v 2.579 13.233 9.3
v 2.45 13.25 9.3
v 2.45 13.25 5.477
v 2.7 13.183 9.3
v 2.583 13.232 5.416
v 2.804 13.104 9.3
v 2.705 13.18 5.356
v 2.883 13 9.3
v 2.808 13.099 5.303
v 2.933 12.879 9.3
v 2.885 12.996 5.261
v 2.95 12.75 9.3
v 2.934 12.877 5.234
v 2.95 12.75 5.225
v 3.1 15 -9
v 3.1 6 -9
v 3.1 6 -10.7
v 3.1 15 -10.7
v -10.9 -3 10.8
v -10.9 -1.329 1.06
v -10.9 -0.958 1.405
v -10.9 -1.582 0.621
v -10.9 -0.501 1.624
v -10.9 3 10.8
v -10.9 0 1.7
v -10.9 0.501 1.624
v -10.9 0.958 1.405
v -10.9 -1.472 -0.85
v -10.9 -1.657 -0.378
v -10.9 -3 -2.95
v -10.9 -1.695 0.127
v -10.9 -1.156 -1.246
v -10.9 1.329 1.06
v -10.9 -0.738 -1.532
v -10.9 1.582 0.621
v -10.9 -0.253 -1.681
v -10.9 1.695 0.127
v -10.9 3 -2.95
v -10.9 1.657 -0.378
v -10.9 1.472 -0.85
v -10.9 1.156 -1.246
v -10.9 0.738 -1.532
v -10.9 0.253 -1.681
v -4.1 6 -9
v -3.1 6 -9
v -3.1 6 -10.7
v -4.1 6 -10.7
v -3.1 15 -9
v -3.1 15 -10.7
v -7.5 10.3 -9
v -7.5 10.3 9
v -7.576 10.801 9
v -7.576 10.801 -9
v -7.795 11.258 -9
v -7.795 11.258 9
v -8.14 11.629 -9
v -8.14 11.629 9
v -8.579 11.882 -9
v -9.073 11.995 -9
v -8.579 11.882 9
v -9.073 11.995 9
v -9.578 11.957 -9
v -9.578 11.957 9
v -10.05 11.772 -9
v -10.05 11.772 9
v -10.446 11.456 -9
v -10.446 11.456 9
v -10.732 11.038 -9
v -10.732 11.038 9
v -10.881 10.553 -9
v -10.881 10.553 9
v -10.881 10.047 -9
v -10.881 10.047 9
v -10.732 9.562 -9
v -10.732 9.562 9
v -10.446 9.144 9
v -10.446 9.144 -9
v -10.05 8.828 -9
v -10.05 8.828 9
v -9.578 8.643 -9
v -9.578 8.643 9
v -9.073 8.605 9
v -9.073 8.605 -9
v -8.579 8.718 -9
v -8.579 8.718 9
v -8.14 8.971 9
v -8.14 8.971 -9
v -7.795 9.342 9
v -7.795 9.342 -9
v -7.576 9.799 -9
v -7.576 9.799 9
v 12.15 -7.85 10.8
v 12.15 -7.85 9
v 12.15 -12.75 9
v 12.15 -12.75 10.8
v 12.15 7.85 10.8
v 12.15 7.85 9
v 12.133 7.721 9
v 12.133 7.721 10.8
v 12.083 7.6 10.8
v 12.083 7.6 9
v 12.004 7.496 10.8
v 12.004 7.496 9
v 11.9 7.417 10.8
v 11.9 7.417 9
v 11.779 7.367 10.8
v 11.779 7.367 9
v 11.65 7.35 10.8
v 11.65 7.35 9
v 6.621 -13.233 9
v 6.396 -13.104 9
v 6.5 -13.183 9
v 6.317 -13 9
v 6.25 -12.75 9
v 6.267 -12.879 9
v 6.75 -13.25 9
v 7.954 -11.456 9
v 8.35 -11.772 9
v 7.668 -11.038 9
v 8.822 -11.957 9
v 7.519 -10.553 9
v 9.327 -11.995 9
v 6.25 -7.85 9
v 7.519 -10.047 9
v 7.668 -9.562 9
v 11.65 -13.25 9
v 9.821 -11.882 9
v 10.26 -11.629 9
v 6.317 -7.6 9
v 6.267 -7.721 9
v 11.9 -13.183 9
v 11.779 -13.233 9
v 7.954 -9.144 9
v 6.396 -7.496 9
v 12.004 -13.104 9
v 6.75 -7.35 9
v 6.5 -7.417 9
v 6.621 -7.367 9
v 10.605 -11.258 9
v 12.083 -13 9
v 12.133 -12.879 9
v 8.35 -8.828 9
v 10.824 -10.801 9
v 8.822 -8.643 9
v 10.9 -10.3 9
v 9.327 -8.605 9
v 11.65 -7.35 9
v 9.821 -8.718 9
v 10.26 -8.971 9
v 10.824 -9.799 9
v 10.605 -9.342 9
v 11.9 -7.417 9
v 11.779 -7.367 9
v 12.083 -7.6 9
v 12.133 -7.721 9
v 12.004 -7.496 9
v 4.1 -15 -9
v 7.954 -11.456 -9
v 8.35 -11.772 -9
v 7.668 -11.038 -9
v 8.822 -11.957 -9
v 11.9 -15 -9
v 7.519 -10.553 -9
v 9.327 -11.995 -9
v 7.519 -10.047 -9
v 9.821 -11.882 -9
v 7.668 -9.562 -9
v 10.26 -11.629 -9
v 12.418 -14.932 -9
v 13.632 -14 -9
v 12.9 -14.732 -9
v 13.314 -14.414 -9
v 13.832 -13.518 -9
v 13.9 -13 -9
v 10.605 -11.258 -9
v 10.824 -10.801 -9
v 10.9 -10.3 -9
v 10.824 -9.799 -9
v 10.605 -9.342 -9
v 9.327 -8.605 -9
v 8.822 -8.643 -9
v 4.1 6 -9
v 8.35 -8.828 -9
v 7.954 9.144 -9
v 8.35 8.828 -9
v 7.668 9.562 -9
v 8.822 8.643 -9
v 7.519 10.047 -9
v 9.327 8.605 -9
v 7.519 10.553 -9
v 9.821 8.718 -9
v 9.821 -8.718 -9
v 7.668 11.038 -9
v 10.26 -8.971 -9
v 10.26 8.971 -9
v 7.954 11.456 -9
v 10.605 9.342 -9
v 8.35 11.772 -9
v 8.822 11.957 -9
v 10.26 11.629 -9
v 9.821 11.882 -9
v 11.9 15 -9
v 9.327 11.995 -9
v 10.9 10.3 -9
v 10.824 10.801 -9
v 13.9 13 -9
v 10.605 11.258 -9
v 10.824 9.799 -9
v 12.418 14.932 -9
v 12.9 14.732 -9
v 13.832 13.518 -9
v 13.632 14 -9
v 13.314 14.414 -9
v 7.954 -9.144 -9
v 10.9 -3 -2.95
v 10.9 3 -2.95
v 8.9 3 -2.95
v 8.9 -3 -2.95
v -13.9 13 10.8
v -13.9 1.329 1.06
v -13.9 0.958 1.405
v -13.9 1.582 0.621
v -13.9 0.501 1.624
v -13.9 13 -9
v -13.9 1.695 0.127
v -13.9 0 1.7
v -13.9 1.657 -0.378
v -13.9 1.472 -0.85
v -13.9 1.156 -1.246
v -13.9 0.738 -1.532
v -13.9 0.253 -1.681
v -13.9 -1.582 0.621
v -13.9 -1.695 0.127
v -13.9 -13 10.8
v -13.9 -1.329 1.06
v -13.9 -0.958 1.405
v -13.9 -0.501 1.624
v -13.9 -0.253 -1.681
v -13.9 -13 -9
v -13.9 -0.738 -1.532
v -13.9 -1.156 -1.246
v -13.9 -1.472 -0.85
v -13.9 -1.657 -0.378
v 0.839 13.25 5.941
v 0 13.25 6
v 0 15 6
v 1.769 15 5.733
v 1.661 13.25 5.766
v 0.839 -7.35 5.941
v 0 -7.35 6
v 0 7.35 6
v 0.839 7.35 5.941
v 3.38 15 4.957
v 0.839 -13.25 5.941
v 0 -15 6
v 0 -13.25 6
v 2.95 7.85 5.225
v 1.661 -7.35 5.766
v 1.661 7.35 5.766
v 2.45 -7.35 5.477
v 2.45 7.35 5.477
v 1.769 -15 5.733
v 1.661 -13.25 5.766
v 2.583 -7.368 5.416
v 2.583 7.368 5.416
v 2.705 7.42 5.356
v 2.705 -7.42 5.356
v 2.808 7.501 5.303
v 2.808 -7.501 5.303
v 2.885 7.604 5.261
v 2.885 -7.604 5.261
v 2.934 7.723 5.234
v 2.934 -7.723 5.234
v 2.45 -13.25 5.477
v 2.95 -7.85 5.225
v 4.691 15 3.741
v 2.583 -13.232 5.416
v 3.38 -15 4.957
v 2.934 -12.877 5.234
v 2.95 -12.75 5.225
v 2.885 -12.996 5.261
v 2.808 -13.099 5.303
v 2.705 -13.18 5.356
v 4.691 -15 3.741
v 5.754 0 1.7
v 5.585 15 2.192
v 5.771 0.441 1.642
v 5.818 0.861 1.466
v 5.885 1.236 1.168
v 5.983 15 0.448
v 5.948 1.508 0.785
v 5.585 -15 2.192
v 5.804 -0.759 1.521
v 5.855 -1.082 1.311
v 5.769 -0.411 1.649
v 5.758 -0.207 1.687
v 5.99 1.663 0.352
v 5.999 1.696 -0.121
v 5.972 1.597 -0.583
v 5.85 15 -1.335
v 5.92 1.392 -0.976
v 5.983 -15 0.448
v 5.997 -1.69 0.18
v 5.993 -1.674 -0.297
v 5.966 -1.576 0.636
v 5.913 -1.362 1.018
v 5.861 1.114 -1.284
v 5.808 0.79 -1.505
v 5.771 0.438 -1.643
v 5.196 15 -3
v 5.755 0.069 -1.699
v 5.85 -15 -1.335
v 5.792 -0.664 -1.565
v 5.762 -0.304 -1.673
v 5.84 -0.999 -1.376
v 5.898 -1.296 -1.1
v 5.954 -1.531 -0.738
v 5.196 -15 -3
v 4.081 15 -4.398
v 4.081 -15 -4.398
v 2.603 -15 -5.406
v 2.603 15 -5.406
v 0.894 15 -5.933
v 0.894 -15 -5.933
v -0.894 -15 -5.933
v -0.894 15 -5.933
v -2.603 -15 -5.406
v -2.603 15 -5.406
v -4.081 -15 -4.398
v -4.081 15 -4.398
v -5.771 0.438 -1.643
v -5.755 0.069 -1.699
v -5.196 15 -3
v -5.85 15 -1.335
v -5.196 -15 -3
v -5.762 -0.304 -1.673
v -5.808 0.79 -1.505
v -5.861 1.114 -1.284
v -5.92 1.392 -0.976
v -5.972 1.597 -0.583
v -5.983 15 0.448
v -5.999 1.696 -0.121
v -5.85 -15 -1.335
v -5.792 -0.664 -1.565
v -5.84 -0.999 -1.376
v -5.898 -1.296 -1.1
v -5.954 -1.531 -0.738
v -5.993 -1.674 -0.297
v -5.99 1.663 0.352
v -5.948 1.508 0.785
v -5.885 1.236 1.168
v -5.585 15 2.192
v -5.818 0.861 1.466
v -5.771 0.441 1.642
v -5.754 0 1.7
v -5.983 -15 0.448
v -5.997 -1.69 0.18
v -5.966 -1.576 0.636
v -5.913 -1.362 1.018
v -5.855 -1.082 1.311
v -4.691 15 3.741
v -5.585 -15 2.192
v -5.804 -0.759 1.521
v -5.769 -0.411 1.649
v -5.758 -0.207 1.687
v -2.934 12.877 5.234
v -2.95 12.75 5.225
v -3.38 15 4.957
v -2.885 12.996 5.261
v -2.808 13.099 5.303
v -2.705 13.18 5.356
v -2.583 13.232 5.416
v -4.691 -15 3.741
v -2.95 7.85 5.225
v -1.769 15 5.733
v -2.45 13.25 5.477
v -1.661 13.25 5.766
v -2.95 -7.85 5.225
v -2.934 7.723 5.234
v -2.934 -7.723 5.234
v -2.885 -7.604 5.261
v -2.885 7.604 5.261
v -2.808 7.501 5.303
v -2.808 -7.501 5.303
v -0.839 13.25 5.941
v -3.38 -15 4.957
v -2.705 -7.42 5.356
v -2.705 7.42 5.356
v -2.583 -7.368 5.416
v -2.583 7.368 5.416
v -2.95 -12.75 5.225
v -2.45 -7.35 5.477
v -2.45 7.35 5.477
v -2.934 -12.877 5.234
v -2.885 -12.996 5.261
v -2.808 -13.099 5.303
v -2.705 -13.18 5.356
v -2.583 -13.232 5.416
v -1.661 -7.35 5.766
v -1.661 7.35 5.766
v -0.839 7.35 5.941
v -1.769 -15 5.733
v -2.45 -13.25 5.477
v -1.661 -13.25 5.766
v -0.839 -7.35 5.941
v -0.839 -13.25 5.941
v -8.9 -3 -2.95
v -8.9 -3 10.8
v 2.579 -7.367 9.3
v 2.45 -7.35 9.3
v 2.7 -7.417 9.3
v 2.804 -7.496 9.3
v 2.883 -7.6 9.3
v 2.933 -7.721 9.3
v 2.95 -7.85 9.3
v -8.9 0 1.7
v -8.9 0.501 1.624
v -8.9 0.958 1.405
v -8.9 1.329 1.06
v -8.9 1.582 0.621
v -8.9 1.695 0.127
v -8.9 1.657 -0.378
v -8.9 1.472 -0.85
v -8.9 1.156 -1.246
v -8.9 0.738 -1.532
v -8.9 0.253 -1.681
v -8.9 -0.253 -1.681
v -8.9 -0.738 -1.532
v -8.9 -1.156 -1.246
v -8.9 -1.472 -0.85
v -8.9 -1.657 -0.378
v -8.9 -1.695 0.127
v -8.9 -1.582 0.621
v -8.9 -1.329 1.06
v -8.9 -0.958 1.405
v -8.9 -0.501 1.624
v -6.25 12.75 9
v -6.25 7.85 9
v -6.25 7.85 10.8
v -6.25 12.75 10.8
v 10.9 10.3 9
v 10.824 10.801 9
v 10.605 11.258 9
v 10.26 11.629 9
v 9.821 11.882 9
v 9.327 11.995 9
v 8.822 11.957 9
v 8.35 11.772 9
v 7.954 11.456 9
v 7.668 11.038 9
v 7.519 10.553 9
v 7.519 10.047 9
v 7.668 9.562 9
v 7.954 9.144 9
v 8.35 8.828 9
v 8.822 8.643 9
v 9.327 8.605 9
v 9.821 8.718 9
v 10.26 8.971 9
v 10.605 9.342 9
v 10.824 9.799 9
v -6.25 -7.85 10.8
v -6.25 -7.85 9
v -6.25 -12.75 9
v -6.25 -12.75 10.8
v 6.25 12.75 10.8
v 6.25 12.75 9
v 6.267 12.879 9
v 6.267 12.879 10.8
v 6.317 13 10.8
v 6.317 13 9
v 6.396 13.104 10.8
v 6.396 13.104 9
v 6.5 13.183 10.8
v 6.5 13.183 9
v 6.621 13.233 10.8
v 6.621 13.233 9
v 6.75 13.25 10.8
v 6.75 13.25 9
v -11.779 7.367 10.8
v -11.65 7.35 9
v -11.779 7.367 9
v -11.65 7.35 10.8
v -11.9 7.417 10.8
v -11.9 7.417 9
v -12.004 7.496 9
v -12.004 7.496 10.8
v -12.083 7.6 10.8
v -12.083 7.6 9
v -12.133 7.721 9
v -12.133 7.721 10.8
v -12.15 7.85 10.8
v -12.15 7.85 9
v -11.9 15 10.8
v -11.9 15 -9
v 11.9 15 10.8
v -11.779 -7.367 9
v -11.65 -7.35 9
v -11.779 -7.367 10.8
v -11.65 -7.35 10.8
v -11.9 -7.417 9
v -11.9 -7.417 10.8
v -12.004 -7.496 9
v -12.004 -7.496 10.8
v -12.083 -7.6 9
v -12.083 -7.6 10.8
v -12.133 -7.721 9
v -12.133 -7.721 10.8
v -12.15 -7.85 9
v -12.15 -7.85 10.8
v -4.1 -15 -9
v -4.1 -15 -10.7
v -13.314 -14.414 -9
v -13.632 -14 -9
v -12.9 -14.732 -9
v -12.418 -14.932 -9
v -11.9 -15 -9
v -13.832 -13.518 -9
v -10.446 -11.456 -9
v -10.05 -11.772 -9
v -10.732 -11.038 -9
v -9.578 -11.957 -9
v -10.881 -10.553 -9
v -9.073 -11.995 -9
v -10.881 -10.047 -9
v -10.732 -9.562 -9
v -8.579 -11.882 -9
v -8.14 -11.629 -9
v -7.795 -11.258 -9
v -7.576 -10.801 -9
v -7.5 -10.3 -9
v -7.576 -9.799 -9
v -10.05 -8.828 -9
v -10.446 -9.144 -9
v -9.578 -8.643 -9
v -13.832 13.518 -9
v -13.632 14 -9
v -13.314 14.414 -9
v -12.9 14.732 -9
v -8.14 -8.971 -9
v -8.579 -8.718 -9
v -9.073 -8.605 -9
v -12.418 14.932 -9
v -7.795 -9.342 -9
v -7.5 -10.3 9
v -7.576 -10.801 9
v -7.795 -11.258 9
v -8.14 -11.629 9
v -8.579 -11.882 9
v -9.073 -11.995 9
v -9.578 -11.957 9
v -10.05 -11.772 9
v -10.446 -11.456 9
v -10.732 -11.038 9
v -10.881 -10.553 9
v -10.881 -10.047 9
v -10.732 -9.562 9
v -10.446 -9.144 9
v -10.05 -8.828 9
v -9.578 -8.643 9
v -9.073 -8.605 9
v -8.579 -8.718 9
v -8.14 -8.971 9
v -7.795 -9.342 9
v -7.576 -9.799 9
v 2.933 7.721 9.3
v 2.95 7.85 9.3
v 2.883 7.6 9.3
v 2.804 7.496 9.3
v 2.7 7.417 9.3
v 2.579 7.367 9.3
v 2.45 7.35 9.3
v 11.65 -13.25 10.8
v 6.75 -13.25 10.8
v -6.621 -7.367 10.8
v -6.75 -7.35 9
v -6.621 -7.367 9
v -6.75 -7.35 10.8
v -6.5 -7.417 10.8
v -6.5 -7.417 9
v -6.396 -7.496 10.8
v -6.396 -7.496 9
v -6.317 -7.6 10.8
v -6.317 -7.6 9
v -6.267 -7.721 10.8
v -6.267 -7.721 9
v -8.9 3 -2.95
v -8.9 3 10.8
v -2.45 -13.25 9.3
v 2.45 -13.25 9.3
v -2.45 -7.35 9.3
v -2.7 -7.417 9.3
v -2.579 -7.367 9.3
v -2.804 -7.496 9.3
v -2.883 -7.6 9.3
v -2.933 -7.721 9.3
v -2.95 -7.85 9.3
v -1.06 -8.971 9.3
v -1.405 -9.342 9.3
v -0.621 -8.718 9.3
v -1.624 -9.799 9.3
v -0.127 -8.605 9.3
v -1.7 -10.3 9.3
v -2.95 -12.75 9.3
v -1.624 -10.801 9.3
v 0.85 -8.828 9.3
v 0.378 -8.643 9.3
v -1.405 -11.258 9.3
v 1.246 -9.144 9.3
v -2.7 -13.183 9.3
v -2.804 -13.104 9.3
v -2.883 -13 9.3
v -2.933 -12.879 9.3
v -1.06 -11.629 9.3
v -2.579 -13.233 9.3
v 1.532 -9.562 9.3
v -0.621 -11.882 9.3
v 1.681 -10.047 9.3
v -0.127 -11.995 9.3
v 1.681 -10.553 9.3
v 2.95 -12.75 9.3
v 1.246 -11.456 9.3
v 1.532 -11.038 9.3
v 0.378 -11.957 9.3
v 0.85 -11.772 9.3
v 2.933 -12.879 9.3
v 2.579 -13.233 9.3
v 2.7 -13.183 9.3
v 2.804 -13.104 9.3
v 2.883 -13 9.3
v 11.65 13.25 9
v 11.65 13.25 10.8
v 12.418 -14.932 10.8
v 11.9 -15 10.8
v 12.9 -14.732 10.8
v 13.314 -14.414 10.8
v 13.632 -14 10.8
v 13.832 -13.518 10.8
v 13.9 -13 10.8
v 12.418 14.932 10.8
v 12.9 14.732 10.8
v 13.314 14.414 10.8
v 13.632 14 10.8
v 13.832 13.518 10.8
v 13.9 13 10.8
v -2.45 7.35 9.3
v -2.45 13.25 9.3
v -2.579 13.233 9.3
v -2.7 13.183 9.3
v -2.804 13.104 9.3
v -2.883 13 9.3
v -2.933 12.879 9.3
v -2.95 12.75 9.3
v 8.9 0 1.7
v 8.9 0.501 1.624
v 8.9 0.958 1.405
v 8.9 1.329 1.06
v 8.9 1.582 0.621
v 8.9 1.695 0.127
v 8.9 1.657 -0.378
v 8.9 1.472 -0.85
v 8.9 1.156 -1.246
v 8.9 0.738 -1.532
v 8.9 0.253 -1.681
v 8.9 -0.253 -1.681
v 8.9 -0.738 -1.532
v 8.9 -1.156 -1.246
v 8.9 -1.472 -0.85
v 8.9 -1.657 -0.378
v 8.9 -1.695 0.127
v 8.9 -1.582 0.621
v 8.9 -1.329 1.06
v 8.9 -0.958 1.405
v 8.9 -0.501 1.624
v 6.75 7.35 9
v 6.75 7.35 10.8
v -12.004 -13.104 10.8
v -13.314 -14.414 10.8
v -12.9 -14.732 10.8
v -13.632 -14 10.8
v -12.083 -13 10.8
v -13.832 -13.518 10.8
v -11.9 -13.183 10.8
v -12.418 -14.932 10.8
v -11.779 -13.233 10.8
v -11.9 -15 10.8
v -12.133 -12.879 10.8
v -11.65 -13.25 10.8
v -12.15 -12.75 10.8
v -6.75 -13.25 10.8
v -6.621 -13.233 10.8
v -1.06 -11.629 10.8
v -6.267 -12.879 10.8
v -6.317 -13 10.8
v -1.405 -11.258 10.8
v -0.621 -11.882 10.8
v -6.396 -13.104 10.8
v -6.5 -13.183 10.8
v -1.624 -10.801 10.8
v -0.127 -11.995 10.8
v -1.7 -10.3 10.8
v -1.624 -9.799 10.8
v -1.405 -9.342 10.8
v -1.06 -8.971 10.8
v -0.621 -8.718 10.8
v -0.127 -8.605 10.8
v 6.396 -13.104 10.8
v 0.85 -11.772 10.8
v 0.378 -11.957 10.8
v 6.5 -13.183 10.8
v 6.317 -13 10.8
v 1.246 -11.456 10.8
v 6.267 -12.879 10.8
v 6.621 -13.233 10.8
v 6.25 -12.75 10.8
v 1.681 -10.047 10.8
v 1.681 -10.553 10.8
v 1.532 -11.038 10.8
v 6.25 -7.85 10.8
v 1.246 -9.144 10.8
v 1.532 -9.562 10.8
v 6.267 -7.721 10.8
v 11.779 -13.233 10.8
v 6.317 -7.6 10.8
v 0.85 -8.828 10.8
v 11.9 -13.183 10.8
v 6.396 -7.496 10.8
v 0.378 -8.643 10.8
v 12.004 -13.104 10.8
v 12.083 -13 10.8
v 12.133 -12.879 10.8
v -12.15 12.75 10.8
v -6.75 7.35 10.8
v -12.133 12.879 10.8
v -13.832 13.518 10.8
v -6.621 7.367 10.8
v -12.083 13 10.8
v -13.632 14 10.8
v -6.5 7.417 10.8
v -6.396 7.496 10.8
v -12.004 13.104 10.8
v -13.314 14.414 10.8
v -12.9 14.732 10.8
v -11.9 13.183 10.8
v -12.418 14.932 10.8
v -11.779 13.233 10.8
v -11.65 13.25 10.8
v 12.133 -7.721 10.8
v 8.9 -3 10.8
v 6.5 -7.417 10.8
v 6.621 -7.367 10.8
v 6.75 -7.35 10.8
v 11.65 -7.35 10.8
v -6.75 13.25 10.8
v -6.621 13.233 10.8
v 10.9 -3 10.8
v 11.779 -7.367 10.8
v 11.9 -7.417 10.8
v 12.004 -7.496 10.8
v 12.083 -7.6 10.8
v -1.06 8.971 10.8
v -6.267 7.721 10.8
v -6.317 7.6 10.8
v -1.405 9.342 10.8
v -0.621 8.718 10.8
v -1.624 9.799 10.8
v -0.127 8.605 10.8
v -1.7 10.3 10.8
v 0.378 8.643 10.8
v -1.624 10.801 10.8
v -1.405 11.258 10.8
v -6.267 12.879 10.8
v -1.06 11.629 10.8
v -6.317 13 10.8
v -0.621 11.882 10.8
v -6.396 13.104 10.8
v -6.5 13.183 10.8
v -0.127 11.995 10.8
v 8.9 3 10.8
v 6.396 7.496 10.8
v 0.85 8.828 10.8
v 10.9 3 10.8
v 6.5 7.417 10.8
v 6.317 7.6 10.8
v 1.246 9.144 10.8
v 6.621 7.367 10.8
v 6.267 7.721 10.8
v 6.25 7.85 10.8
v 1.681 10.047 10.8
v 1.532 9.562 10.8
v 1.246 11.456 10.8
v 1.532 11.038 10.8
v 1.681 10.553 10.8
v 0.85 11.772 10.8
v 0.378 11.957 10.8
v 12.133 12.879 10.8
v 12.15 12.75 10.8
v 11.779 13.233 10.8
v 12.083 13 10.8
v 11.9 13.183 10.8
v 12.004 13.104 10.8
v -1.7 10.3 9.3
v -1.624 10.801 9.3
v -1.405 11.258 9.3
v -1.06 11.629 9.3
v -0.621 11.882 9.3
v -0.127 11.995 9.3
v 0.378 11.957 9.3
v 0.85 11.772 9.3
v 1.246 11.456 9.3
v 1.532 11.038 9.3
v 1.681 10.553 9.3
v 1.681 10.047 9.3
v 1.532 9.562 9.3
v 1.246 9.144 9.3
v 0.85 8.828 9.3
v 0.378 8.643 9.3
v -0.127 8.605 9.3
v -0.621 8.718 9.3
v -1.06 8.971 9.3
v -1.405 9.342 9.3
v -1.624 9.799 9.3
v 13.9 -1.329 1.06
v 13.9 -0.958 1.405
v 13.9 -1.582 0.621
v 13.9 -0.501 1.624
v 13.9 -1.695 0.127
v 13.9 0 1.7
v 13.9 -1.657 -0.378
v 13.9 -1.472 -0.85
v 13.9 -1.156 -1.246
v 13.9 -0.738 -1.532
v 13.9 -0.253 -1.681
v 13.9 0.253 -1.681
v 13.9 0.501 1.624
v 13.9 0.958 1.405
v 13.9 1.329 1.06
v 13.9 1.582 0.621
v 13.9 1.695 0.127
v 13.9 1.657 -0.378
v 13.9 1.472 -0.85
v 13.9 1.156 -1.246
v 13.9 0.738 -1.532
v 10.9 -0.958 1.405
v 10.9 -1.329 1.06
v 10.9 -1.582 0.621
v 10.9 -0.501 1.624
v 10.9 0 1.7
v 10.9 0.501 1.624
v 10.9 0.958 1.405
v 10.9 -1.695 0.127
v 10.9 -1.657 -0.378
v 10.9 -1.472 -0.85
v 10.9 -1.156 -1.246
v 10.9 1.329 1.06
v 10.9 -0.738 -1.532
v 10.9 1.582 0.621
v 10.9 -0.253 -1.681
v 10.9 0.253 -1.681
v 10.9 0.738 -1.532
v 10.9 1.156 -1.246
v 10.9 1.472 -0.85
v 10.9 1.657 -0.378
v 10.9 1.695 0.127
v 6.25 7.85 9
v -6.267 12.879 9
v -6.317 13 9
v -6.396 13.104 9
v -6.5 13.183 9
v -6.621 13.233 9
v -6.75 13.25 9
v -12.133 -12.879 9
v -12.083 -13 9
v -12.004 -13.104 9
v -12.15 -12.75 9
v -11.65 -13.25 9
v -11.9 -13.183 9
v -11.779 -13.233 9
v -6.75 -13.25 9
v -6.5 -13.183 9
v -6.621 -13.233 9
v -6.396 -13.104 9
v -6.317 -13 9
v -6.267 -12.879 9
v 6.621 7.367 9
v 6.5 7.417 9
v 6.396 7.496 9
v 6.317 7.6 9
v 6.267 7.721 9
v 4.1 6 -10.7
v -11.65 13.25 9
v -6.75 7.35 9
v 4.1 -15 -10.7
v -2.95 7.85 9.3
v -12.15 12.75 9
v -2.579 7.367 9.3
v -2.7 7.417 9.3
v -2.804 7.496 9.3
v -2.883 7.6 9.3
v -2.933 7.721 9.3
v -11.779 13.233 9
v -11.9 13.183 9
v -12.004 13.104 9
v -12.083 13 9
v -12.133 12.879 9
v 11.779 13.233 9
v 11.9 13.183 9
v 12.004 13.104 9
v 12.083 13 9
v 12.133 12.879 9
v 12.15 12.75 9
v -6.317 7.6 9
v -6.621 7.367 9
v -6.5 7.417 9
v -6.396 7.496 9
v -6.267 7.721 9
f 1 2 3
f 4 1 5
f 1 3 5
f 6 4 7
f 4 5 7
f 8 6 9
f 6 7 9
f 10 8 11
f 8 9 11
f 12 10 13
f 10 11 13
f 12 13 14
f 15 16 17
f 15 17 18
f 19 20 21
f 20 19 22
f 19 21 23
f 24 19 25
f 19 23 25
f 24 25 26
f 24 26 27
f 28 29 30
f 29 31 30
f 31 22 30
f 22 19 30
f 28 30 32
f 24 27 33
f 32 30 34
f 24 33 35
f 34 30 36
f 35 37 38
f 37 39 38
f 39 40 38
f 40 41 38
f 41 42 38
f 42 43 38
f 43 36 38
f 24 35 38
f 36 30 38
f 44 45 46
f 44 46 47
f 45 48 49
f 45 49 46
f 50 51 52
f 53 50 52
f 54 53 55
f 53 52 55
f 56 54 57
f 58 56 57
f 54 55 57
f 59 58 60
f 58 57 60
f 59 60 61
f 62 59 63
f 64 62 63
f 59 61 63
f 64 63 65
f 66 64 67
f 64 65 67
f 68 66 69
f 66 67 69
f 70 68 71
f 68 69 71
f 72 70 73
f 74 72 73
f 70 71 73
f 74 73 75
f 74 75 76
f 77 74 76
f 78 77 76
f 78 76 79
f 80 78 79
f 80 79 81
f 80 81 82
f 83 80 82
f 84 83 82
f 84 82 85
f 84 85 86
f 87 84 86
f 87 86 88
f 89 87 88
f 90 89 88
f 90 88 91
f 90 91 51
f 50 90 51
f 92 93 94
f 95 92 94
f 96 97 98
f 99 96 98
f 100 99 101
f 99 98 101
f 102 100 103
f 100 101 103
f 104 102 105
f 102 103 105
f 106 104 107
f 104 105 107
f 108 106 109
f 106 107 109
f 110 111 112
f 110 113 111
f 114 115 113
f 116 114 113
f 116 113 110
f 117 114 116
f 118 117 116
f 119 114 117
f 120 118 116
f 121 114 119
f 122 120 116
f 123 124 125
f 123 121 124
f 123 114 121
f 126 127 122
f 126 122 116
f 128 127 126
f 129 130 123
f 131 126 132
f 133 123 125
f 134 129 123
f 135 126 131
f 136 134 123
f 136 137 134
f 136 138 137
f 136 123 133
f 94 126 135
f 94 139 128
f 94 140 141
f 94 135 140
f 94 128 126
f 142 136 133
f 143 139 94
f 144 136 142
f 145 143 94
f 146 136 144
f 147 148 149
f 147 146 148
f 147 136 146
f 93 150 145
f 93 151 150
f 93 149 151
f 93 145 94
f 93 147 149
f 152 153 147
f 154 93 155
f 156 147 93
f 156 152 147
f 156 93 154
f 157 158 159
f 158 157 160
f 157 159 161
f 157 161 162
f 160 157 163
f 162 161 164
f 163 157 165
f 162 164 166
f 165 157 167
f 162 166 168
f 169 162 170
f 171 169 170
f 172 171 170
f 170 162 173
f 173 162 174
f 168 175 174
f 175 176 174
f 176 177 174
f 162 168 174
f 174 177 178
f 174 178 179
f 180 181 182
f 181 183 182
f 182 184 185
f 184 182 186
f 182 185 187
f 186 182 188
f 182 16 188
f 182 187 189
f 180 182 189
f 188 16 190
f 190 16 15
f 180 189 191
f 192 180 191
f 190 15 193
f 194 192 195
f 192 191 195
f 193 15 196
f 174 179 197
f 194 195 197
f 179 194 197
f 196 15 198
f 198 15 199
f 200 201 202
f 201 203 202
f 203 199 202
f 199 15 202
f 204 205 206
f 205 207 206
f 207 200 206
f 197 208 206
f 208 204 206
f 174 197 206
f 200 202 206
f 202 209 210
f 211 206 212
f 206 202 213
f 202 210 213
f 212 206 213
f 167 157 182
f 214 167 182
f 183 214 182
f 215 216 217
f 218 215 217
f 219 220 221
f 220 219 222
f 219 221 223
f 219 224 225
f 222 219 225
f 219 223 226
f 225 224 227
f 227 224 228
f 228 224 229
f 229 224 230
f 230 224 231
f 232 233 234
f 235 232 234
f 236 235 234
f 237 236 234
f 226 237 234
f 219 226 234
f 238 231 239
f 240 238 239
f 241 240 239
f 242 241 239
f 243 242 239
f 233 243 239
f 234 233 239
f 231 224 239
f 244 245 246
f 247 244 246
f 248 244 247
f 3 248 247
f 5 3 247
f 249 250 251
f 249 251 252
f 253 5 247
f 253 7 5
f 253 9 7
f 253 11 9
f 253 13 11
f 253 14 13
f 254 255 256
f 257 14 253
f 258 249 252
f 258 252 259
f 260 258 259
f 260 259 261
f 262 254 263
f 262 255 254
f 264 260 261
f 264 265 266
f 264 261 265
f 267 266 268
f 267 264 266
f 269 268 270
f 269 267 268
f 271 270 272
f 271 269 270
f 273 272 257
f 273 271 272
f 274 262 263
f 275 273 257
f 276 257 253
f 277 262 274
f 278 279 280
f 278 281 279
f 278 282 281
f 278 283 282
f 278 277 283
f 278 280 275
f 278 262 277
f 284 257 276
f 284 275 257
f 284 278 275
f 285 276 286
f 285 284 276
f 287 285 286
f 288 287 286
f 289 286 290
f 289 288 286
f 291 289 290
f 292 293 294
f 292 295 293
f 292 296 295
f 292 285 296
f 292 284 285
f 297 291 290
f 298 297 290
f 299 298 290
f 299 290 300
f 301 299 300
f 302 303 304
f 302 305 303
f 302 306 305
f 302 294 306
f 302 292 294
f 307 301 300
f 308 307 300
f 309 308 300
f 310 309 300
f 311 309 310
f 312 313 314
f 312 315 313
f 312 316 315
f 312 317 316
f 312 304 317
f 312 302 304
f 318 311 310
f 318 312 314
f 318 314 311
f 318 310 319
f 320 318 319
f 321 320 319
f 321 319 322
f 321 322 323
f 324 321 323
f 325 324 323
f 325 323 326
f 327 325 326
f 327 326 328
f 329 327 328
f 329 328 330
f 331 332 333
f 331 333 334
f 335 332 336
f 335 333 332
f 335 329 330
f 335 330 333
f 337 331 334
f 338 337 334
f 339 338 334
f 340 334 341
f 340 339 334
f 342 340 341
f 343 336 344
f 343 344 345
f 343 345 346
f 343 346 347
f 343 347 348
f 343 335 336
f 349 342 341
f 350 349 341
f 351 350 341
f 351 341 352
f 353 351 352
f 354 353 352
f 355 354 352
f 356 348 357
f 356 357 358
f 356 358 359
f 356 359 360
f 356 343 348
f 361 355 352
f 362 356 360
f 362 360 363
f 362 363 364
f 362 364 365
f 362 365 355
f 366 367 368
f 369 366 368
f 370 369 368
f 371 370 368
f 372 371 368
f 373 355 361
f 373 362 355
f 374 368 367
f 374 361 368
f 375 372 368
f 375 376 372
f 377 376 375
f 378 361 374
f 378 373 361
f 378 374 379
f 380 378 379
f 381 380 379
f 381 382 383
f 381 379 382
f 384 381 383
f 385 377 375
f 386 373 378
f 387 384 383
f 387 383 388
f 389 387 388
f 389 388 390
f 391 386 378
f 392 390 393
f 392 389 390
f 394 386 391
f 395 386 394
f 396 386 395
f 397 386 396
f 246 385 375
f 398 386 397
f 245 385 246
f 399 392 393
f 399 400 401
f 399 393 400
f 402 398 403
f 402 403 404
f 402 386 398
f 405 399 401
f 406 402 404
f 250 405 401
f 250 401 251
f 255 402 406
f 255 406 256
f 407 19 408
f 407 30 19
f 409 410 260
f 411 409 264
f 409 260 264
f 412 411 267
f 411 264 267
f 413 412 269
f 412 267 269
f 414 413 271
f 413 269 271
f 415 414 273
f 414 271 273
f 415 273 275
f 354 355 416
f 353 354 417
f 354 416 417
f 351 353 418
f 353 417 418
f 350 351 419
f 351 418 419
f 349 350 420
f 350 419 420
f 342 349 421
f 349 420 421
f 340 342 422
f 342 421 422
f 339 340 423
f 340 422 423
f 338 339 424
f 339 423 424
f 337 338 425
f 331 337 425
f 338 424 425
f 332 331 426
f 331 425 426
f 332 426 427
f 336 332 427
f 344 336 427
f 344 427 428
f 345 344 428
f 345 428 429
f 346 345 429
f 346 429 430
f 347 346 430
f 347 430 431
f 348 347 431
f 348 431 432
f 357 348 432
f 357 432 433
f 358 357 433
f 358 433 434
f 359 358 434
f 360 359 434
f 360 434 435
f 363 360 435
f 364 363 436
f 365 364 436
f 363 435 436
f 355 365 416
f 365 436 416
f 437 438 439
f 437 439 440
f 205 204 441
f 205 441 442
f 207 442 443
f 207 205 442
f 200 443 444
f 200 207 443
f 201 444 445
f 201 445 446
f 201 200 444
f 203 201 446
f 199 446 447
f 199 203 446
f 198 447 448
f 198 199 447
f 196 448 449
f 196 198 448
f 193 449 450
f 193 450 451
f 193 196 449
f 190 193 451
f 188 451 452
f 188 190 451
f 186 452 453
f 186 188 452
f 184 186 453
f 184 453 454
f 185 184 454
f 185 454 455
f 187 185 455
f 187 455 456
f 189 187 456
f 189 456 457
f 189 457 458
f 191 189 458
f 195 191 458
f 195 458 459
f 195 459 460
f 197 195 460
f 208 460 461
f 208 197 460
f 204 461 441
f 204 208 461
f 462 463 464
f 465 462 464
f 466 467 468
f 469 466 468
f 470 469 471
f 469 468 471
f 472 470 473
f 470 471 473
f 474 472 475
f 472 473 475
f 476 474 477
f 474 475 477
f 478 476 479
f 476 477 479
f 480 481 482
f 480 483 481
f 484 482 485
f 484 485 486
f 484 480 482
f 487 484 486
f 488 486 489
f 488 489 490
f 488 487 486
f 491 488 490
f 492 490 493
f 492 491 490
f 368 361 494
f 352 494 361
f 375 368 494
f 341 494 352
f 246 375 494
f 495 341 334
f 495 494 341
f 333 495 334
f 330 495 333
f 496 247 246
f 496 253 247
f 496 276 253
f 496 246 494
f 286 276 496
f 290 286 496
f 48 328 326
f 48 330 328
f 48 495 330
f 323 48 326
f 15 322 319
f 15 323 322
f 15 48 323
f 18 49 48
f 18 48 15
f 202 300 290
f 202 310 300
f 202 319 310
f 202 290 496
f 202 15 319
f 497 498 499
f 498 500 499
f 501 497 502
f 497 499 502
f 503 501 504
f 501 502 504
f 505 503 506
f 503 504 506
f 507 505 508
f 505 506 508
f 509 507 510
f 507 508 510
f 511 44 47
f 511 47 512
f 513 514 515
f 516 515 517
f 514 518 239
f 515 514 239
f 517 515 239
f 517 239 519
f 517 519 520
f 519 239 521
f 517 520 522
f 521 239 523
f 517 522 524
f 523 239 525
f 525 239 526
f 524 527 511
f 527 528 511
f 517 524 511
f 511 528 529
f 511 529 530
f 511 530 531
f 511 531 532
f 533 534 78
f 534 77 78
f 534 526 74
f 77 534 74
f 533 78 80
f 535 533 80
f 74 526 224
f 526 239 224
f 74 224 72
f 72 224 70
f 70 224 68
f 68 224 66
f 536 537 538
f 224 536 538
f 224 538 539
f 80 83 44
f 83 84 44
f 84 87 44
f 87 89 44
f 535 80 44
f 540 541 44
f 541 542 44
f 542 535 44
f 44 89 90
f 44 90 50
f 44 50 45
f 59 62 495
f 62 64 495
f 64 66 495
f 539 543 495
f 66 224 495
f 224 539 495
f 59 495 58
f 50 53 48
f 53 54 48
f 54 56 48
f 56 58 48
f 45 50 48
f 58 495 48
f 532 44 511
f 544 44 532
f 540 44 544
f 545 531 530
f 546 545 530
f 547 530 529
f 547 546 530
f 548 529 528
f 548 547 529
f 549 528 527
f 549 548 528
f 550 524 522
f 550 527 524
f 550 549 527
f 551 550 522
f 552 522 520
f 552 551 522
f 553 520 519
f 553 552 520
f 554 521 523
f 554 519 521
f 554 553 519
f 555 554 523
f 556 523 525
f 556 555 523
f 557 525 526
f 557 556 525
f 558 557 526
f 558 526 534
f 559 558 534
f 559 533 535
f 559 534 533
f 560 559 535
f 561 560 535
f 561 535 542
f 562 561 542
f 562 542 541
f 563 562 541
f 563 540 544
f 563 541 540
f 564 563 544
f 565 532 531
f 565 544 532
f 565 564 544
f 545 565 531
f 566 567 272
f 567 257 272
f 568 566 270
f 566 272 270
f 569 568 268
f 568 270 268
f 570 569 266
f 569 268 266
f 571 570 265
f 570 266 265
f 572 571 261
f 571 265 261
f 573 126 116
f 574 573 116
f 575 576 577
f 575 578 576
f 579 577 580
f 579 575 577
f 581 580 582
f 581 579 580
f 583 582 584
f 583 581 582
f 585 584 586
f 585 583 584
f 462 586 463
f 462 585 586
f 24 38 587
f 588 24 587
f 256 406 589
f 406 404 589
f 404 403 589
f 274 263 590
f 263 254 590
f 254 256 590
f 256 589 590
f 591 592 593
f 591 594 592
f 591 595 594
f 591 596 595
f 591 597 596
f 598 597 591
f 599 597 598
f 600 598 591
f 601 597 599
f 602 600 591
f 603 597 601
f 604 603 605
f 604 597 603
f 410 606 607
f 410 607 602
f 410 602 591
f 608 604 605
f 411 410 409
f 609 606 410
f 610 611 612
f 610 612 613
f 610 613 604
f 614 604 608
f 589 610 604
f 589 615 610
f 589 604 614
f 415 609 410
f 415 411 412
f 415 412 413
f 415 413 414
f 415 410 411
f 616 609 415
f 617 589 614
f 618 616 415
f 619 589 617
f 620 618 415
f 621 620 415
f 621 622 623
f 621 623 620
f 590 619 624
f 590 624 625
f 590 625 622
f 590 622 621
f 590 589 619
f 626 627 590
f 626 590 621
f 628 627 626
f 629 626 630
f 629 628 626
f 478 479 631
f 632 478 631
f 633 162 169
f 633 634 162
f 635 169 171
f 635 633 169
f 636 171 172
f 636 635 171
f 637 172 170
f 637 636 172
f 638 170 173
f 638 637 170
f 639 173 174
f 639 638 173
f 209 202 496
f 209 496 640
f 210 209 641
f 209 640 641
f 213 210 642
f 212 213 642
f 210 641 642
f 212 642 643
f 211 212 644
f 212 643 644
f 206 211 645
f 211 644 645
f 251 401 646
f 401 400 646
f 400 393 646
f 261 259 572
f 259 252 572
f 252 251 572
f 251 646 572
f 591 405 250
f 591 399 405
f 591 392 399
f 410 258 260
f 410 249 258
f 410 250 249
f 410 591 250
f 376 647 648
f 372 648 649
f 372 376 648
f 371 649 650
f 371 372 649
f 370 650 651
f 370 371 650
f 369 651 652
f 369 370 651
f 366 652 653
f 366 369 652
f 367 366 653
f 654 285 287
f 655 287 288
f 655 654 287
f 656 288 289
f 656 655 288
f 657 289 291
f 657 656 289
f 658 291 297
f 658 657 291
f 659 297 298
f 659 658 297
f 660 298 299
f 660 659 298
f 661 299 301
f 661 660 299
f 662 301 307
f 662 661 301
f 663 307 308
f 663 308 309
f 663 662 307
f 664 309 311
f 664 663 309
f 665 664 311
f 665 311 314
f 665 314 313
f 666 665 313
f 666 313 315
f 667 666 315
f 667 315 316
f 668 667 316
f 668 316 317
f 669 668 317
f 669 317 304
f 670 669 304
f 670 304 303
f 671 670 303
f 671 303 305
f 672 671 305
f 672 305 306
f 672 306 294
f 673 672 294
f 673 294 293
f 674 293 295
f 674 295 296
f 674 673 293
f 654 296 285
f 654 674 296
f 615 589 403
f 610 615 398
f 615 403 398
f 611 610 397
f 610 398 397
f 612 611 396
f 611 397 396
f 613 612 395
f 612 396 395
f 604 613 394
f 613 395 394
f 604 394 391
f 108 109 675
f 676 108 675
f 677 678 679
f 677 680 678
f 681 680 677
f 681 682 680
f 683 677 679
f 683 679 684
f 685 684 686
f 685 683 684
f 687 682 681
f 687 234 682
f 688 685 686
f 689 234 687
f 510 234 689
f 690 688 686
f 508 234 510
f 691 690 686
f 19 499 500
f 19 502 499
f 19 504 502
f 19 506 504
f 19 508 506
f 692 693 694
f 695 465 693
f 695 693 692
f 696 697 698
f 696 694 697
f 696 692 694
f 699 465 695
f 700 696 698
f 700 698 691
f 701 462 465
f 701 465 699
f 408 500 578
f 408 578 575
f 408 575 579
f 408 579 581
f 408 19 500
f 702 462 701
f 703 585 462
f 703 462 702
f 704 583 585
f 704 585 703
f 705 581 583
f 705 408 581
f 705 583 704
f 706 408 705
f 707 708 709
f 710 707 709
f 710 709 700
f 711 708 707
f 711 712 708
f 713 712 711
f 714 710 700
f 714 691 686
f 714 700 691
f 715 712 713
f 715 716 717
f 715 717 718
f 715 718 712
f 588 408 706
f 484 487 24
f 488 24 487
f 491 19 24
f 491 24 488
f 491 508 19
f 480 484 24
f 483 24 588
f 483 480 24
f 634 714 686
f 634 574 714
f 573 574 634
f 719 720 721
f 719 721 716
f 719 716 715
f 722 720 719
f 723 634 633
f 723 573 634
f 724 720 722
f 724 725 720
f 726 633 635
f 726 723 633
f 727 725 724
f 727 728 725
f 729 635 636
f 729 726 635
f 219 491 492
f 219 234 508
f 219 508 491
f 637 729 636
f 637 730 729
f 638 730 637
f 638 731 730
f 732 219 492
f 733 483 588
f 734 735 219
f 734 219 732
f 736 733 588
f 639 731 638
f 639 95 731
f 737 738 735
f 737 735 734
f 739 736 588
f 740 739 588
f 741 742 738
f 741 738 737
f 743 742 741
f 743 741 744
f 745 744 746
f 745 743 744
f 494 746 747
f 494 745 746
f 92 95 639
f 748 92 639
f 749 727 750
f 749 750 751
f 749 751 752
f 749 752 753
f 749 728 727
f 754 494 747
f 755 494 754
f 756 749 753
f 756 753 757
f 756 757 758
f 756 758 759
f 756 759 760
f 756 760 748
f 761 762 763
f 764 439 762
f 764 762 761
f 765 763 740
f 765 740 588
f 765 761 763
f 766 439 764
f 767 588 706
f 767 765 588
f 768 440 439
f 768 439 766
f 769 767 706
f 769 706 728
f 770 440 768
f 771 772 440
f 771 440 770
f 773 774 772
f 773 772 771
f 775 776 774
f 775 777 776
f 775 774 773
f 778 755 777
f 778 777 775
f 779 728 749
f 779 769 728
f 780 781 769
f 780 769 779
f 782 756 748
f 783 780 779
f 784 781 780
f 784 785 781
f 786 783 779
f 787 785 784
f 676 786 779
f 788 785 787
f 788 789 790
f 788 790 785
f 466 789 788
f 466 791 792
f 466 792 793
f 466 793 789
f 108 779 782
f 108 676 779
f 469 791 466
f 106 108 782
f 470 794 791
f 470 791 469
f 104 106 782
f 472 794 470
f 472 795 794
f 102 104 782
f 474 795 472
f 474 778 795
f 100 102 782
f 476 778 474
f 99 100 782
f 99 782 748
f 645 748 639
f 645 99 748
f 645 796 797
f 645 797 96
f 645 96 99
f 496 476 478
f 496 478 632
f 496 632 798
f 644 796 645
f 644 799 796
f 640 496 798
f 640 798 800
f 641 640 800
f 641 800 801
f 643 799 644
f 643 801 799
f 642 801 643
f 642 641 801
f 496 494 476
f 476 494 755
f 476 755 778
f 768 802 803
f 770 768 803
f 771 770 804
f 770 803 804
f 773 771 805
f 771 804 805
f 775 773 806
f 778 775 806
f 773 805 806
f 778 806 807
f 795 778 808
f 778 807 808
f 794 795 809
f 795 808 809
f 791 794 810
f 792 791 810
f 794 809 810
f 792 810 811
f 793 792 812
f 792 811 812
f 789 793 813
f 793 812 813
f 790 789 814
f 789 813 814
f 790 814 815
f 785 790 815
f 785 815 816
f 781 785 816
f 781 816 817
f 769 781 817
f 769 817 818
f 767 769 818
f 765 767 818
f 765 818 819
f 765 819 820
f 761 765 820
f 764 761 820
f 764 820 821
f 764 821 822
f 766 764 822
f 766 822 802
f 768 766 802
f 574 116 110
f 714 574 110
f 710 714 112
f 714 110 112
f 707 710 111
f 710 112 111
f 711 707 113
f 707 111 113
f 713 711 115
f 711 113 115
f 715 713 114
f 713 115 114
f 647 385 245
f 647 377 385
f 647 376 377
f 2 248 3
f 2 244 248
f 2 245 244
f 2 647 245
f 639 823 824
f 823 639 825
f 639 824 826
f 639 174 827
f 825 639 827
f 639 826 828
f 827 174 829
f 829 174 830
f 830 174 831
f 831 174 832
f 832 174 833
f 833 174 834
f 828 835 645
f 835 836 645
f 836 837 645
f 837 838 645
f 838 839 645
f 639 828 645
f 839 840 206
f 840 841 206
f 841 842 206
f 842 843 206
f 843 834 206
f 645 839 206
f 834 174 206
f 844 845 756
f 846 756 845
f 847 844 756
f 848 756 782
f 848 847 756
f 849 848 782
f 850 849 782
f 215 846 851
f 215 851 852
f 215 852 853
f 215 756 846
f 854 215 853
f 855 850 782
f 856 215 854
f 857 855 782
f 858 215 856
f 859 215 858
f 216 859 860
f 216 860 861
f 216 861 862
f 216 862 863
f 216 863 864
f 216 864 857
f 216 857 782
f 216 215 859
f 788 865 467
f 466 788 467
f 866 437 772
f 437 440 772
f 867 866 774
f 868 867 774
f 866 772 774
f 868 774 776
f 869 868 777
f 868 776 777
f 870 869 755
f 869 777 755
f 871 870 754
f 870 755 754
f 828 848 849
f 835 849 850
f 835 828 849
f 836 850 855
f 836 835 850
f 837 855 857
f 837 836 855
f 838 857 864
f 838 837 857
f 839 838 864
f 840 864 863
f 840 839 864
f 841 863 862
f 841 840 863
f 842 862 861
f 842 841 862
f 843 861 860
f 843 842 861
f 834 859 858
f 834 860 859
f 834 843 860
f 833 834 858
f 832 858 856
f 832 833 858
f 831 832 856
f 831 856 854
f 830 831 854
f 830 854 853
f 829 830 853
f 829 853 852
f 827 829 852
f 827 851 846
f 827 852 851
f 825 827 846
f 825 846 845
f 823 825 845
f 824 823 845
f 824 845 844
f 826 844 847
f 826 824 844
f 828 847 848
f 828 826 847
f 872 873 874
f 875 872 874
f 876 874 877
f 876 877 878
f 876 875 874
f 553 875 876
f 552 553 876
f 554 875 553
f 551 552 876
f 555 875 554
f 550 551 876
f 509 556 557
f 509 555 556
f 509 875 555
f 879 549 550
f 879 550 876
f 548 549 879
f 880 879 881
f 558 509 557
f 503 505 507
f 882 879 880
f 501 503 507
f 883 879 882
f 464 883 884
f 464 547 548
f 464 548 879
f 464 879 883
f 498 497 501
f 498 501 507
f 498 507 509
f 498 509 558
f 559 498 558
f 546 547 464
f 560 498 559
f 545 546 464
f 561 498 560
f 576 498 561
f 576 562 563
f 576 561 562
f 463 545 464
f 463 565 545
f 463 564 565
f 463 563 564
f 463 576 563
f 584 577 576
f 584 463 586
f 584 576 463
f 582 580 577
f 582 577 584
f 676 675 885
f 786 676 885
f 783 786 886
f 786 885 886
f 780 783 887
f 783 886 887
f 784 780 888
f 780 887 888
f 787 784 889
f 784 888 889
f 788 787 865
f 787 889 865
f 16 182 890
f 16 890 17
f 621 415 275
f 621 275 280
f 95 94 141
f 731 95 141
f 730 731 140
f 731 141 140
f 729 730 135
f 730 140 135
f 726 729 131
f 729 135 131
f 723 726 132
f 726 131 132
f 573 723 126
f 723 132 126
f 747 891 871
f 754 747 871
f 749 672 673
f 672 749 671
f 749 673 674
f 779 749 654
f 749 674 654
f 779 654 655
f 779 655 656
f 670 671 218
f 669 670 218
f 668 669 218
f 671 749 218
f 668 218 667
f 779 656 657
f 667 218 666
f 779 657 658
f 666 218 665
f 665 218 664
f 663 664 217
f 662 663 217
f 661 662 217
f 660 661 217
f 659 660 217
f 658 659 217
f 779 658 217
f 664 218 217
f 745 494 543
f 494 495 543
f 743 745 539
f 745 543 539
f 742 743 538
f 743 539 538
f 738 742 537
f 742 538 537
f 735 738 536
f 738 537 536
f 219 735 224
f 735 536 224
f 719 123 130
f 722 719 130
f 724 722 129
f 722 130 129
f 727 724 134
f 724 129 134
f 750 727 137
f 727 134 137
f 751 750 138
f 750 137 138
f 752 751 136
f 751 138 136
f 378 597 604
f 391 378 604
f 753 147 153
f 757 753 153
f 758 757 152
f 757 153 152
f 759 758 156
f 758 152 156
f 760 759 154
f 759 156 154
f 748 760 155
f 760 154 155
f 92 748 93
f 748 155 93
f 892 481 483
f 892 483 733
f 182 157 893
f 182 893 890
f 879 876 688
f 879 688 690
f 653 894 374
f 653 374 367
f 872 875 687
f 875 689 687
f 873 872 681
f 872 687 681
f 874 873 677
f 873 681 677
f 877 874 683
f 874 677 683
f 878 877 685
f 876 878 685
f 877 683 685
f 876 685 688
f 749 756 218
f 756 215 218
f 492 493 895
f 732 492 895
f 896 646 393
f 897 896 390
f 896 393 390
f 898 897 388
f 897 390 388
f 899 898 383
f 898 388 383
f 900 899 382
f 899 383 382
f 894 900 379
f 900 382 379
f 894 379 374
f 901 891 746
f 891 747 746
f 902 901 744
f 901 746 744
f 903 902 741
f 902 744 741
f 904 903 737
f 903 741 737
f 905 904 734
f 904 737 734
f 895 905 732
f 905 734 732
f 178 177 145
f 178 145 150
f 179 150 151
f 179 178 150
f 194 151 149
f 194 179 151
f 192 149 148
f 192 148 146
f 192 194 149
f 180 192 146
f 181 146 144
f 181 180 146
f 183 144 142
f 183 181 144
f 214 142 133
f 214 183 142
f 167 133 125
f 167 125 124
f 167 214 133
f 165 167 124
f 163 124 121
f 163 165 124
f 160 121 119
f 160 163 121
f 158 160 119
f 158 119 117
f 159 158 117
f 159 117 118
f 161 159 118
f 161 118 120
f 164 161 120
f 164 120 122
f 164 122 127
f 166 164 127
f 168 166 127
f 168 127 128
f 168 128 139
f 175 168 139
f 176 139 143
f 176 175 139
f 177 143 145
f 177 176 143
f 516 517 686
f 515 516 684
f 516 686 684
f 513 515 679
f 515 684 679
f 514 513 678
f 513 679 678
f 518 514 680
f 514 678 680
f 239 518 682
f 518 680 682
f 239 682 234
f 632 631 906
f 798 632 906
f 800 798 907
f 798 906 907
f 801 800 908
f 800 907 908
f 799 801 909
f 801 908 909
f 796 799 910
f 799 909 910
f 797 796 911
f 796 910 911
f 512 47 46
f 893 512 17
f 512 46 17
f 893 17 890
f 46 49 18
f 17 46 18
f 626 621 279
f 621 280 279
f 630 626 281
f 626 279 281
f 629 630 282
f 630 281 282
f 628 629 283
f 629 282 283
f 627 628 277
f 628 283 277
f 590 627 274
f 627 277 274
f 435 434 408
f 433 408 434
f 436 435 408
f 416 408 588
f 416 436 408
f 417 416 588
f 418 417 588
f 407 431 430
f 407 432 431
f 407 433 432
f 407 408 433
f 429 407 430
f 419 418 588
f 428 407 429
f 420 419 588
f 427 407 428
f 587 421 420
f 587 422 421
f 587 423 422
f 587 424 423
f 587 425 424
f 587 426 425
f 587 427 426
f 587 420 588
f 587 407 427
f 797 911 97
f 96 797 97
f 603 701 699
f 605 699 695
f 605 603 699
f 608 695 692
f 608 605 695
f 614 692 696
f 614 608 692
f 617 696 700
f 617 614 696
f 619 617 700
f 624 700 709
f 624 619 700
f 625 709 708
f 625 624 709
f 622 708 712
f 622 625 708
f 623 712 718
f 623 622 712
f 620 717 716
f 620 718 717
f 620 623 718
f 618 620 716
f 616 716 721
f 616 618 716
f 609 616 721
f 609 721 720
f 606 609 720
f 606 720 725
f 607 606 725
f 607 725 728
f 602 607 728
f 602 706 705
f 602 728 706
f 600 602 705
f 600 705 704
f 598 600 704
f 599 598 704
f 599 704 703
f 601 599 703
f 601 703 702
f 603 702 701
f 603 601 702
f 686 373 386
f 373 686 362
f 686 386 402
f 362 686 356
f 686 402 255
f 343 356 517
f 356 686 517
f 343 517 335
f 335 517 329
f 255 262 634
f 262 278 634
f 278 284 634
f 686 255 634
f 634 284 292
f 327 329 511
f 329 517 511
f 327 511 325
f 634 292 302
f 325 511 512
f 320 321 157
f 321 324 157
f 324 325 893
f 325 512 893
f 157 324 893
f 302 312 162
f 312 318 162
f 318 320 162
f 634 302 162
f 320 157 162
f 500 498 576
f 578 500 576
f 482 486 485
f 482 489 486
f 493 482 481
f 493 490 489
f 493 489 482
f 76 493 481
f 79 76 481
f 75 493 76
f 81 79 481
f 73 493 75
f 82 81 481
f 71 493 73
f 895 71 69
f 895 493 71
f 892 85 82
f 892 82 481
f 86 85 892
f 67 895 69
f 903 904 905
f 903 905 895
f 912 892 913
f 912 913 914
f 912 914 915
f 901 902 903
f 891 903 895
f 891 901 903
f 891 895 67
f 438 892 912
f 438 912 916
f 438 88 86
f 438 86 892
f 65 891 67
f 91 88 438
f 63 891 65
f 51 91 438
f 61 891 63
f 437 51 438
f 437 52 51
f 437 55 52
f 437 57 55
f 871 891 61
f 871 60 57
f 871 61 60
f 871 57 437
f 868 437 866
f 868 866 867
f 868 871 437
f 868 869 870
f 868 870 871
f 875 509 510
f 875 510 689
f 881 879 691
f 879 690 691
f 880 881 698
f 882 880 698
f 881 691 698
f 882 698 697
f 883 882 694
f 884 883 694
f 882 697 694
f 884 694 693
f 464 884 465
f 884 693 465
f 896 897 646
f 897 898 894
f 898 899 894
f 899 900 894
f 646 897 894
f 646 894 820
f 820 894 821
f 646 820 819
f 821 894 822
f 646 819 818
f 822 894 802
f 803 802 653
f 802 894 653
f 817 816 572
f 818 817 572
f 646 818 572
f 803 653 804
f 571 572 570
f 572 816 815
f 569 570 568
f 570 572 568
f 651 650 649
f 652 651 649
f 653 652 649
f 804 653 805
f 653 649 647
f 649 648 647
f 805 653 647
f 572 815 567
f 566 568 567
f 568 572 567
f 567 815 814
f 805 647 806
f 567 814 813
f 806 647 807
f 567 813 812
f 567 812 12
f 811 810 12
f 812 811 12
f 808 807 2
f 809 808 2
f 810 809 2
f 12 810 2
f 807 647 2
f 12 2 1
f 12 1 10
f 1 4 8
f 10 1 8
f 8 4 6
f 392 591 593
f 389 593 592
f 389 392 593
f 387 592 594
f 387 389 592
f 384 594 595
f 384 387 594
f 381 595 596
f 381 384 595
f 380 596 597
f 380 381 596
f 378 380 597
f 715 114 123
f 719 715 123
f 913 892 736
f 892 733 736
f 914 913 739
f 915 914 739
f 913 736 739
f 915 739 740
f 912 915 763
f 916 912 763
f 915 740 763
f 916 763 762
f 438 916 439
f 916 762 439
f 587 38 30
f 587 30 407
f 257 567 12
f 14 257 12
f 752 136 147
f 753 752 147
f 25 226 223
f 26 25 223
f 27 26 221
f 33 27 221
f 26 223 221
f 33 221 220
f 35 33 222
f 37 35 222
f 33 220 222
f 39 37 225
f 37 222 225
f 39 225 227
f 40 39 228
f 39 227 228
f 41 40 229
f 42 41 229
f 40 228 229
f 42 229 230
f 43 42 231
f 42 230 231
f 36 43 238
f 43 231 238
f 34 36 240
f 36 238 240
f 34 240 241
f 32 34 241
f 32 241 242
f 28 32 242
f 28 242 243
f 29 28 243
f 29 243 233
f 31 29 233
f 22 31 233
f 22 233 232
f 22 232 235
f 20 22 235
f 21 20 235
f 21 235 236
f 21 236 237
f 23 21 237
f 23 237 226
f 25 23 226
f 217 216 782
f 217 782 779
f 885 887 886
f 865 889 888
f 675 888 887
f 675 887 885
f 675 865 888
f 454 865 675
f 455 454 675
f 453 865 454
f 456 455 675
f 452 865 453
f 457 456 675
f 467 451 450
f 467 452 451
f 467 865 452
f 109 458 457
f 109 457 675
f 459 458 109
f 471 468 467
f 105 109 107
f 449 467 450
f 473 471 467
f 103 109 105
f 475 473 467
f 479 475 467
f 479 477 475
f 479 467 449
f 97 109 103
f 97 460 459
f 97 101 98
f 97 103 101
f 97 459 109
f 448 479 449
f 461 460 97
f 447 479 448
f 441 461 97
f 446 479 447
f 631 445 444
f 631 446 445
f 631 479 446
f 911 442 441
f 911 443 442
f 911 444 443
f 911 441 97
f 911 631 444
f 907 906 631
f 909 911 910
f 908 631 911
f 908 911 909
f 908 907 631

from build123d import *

# Parameters (mm, degrees)
SKETCH2_W               = 27.8
SKETCH2_H               = 18
SKETCH2_R               = 6
BOSS_EXTRUDE1_DEPTH     = 15
SKETCH7_W               = 13.9
SKETCH7_H               = 15
SKETCH7_W_2             = 5.9
SKETCH7_H_2             = 5.9
BOSS_EXTRUDE3_DEPTH     = 1.8
SKETCH8_R               = 1.7
CUT_EXTRUDE3_DEPTH      = 29.464890655
FILLET4_R               = 0.5
FILLET4_OF_MIRROR1_R    = 0.5
MIRROR2_START           = -9
MIRROR2_OUTLINE_R       = 1.7
MIRROR2_DEPTH           = 18
MIRROR2_START_2         = 9
MIRROR2_2_OUTLINE_W     = 13.9
MIRROR2_2_OUTLINE_H     = 30
MIRROR2_2_DEPTH         = 1.8
FILLET3_R               = 2
BOSS_EXTRUDE4_DEPTH     = 1.7
CUT_EXTRUDE4_REACH      = 33.173
CUT_EXTRUDE4_END_RADIUS = 6
CUT_EXTRUDE4_START      = -1.5
SKETCH10_W              = 5.9
SKETCH10_H              = 5.9
FILLET5_R               = 0.5
SKETCH11_R              = 1.7
CUT_EXTRUDE5_DEPTH      = 29.604370348
FILLET5_OF_MIRROR3_R    = 0.5
CUT_EXTRUDE6_START      = -10.8
SKETCH12_W              = 2
SKETCH12_H              = 6
CUT_EXTRUDE6_DEPTH      = 10.8
SKETCH13_W              = 2
SKETCH13_H              = 6
CUT_EXTRUDE7_DEPTH      = 2.95
CUT_EXTRUDE8_REACH      = 35.384
CUT_EXTRUDE8_END_RADIUS = 6
SKETCH14_R              = 1.7


# Read off the part's stored shape, not the designer's step: Mirror2
with BuildPart() as part:
    # Sketch2 → Boss-Extrude1 (new, symmetric)
    with BuildSketch(Plane(origin=(0, 0, 0), x_dir=(1, 0, 0), z_dir=(0, 1, 0))):
        Rectangle(SKETCH2_W, SKETCH2_H)
        with Locations(Location((0, 0, 0), (0, 0, 270))):
            Circle(SKETCH2_R, mode=Mode.SUBTRACT)
    extrude(amount=BOSS_EXTRUDE1_DEPTH, both=True)

    # Sketch7 → Boss-Extrude3 (add)
    with BuildSketch(Plane.XY.offset(9)):
        with Locations((-6.95, 7.5)):
            Rectangle(SKETCH7_W, SKETCH7_H)
        with Locations((-9.2, 10.3)):
            Rectangle(SKETCH7_W_2, SKETCH7_H_2, mode=Mode.SUBTRACT)
    boss_extrude3 = extrude(amount=BOSS_EXTRUDE3_DEPTH)

    # Sketch8 → Cut-Extrude3 (cut, through all)
    with BuildSketch(Plane.XY.offset(10.8)):
        with Locations((-9.2, 10.3)):
            Circle(SKETCH8_R)
    cut_extrude3 = extrude(amount=-CUT_EXTRUDE3_DEPTH, mode=Mode.SUBTRACT)

    # Fillet4
    fillet4_edges = [part.edges().sort_by_distance(p)[0] for p in [
        (-6.25, 13.25, 9.9),
        (-12.15, 13.25, 9.9),
        (-12.15, 7.35, 9.9),
        (-6.25, 7.35, 9.9),
    ]]
    fillet(fillet4_edges, radius=FILLET4_R)

    # Mirror1: Boss-Extrude3, Cut-Extrude3 across plane
    add(boss_extrude3.mirror(Plane.ZX))
    add(cut_extrude3.mirror(Plane.ZX), mode=Mode.SUBTRACT)

    # Fillet4 of Mirror1
    fillet4_of_mirror1_edges = [part.edges().sort_by_distance(p)[0] for p in [
        (-6.25, -13.25, 9.9),
        (-12.15, -13.25, 9.9),
        (-12.15, -7.35, 9.9),
        (-6.25, -7.35, 9.9),
    ]]
    fillet(fillet4_of_mirror1_edges, radius=FILLET4_OF_MIRROR1_R)

    # Mirror2 outline → Mirror2 (cut)
    with BuildSketch(Plane.XY.offset(MIRROR2_START)):
        with Locations((9.2, -10.3)):
            Circle(MIRROR2_OUTLINE_R)
        with Locations((9.2, 10.3)):
            Circle(MIRROR2_OUTLINE_R)
    extrude(amount=MIRROR2_DEPTH, mode=Mode.SUBTRACT)

    # Mirror2 2 outline → Mirror2 2 (add)
    with BuildSketch(Plane.XY.offset(MIRROR2_START_2)):
        with Locations((6.95, 0)):
            Rectangle(MIRROR2_2_OUTLINE_W, MIRROR2_2_OUTLINE_H)
        with BuildLine():
            ThreePointArc((6.25, -7.85), (6.396446609, -7.496446609), (6.75, -7.35))
            Line((6.75, -7.35), (11.65, -7.35))
            ThreePointArc((11.65, -7.35), (12.003553391, -7.496446609), (12.15, -7.85))
            Line((12.15, -7.85), (12.15, -12.75))
            ThreePointArc((12.15, -12.75), (12.003553391, -13.103553391), (11.65, -13.25))
            Line((11.65, -13.25), (6.75, -13.25))
            ThreePointArc((6.75, -13.25), (6.396446609, -13.103553391), (6.25, -12.75))
            Line((6.25, -12.75), (6.25, -7.85))
        make_face(mode=Mode.SUBTRACT)
        with BuildLine():
            Line((6.75, 13.25), (11.65, 13.25))
            ThreePointArc((11.65, 13.25), (12.003553391, 13.103553391), (12.15, 12.75))
            Line((12.15, 12.75), (12.15, 7.85))
            ThreePointArc((12.15, 7.85), (12.003553391, 7.496446609), (11.65, 7.35))
            Line((11.65, 7.35), (6.75, 7.35))
            ThreePointArc((6.75, 7.35), (6.396446609, 7.496446609), (6.25, 7.85))
            Line((6.25, 7.85), (6.25, 12.75))
            ThreePointArc((6.25, 12.75), (6.396446609, 13.103553391), (6.75, 13.25))
        make_face(mode=Mode.SUBTRACT)
    extrude(amount=MIRROR2_2_DEPTH)

    # Fillet3
    fillet3_edges = [part.edges().sort_by_distance(p)[0] for p in [
        (-13.9, 15, 0.9),
        (13.9, 15, 0.9),
        (-13.9, -15, 0.9),
        (13.9, -15, 0.9),
    ]]
    fillet(fillet3_edges, radius=FILLET3_R)

    # Sketch9 → Boss-Extrude4 (add)
    with BuildSketch(Plane(origin=(0, 0, -9), x_dir=(-1, 0, 0), z_dir=(0, 0, -1))):
        Polygon((-3.1, 15), (3.1, 15), (3.1, 6), (4.1, 6), (4.1, -15), (-4.1, -15), (-4.1, 6), (-3.1, 6), align=None)
    extrude(amount=BOSS_EXTRUDE4_DEPTH)

    # Cut-Extrude4: up to this cylinder (the profile starts outside it)
    cut_extrude4_end = Plane(origin=(0, 10.3, 0), z_dir=(0, -1, 0)) * Cylinder(CUT_EXTRUDE4_END_RADIUS, 79.346, mode=Mode.PRIVATE)
    # Sketch10 → Cut-Extrude4 (cut, up to the surface)
    with BuildSketch(Plane.XY.offset(10.8).offset(CUT_EXTRUDE4_START), mode=Mode.PRIVATE) as cut_extrude4_sk1:
        with Locations((0, 10.3)):
            Rectangle(SKETCH10_W, SKETCH10_H)
    cut_extrude4_tool1 = extrude(cut_extrude4_sk1.sketch, amount=-CUT_EXTRUDE4_REACH, mode=Mode.PRIVATE) - cut_extrude4_end
    cut_extrude4 = cut_extrude4_tool1.solids().sort_by_distance((0, 10.3, 9.3))[0]
    add(cut_extrude4, mode=Mode.SUBTRACT)

    # Fillet5
    fillet5_edges = [part.edges().sort_by_distance(p)[0] for p in [
        (2.95, 13.25, 7.262350474),
        (2.95, 7.35, 7.262350474),
        (-2.95, 7.35, 7.262350474),
        (-2.95, 13.25, 7.262350474),
    ]]
    fillet(fillet5_edges, radius=FILLET5_R)

    # Sketch11 → Cut-Extrude5 (cut, through all)
    with BuildSketch(Plane(origin=(0, 0, 9.3), x_dir=(-1, 0, 0), z_dir=(0, 0, -1))):
        with Locations((0, 10.3)):
            Circle(SKETCH11_R)
    cut_extrude5 = extrude(amount=-CUT_EXTRUDE5_DEPTH, mode=Mode.SUBTRACT)

    # Mirror3: Cut-Extrude4, Cut-Extrude5 across plane
    add(cut_extrude4.mirror(Plane.ZX), mode=Mode.SUBTRACT)
    add(cut_extrude5.mirror(Plane.ZX), mode=Mode.SUBTRACT)

    # Fillet5 of Mirror3
    fillet5_of_mirror3_edges = [part.edges().sort_by_distance(p)[0] for p in [
        (2.95, -13.25, 7.262350474),
        (2.95, -7.35, 7.262350474),
        (-2.95, -7.35, 7.262350474),
        (-2.95, -13.25, 7.262350474),
    ]]
    fillet(fillet5_of_mirror3_edges, radius=FILLET5_OF_MIRROR3_R)

    # Sketch12 → Cut-Extrude6 (cut)
    with BuildSketch(Plane.XY.offset(10.8).offset(CUT_EXTRUDE6_START)):
        with Locations((-9.9, 0)):
            Rectangle(SKETCH12_W, SKETCH12_H)
    cut_extrude6 = extrude(amount=CUT_EXTRUDE6_DEPTH, mode=Mode.SUBTRACT)

    # Sketch13 → Cut-Extrude7 (cut)
    with BuildSketch(Plane.XY):
        with Locations((-9.9, 0)):
            Rectangle(SKETCH13_W, SKETCH13_H)
    cut_extrude7 = extrude(amount=-CUT_EXTRUDE7_DEPTH, mode=Mode.SUBTRACT)

    # Cut-Extrude8: up to this cylinder (the profile starts outside it)
    cut_extrude8_end = Plane(origin=(0, 0, 0), z_dir=(0, -1, 0)) * Cylinder(CUT_EXTRUDE8_END_RADIUS, 83.768, mode=Mode.PRIVATE)
    # Sketch14 → Cut-Extrude8 (cut, up to the surface)
    with BuildSketch(Plane.ZY.offset(13.9), mode=Mode.PRIVATE) as cut_extrude8_sk1:
        Circle(SKETCH14_R)
    cut_extrude8_tool1 = extrude(cut_extrude8_sk1.sketch, amount=-CUT_EXTRUDE8_REACH, mode=Mode.PRIVATE) - cut_extrude8_end
    cut_extrude8 = cut_extrude8_tool1.solids().sort_by_distance((-13.9, 0, 0))[0]
    add(cut_extrude8, mode=Mode.SUBTRACT)

    # Mirror4: Cut-Extrude6, Cut-Extrude7, Cut-Extrude8 across plane
    add(cut_extrude6.mirror(Plane(origin=(0, 0, 0), x_dir=(0, 0, 1), z_dir=(1, 0, 0))), mode=Mode.SUBTRACT)
    add(cut_extrude7.mirror(Plane(origin=(0, 0, 0), x_dir=(0, 0, 1), z_dir=(1, 0, 0))), mode=Mode.SUBTRACT)
    add(cut_extrude8.mirror(Plane(origin=(0, 0, 0), x_dir=(0, 0, 1), z_dir=(1, 0, 0))), mode=Mode.SUBTRACT)


solid = part.part
